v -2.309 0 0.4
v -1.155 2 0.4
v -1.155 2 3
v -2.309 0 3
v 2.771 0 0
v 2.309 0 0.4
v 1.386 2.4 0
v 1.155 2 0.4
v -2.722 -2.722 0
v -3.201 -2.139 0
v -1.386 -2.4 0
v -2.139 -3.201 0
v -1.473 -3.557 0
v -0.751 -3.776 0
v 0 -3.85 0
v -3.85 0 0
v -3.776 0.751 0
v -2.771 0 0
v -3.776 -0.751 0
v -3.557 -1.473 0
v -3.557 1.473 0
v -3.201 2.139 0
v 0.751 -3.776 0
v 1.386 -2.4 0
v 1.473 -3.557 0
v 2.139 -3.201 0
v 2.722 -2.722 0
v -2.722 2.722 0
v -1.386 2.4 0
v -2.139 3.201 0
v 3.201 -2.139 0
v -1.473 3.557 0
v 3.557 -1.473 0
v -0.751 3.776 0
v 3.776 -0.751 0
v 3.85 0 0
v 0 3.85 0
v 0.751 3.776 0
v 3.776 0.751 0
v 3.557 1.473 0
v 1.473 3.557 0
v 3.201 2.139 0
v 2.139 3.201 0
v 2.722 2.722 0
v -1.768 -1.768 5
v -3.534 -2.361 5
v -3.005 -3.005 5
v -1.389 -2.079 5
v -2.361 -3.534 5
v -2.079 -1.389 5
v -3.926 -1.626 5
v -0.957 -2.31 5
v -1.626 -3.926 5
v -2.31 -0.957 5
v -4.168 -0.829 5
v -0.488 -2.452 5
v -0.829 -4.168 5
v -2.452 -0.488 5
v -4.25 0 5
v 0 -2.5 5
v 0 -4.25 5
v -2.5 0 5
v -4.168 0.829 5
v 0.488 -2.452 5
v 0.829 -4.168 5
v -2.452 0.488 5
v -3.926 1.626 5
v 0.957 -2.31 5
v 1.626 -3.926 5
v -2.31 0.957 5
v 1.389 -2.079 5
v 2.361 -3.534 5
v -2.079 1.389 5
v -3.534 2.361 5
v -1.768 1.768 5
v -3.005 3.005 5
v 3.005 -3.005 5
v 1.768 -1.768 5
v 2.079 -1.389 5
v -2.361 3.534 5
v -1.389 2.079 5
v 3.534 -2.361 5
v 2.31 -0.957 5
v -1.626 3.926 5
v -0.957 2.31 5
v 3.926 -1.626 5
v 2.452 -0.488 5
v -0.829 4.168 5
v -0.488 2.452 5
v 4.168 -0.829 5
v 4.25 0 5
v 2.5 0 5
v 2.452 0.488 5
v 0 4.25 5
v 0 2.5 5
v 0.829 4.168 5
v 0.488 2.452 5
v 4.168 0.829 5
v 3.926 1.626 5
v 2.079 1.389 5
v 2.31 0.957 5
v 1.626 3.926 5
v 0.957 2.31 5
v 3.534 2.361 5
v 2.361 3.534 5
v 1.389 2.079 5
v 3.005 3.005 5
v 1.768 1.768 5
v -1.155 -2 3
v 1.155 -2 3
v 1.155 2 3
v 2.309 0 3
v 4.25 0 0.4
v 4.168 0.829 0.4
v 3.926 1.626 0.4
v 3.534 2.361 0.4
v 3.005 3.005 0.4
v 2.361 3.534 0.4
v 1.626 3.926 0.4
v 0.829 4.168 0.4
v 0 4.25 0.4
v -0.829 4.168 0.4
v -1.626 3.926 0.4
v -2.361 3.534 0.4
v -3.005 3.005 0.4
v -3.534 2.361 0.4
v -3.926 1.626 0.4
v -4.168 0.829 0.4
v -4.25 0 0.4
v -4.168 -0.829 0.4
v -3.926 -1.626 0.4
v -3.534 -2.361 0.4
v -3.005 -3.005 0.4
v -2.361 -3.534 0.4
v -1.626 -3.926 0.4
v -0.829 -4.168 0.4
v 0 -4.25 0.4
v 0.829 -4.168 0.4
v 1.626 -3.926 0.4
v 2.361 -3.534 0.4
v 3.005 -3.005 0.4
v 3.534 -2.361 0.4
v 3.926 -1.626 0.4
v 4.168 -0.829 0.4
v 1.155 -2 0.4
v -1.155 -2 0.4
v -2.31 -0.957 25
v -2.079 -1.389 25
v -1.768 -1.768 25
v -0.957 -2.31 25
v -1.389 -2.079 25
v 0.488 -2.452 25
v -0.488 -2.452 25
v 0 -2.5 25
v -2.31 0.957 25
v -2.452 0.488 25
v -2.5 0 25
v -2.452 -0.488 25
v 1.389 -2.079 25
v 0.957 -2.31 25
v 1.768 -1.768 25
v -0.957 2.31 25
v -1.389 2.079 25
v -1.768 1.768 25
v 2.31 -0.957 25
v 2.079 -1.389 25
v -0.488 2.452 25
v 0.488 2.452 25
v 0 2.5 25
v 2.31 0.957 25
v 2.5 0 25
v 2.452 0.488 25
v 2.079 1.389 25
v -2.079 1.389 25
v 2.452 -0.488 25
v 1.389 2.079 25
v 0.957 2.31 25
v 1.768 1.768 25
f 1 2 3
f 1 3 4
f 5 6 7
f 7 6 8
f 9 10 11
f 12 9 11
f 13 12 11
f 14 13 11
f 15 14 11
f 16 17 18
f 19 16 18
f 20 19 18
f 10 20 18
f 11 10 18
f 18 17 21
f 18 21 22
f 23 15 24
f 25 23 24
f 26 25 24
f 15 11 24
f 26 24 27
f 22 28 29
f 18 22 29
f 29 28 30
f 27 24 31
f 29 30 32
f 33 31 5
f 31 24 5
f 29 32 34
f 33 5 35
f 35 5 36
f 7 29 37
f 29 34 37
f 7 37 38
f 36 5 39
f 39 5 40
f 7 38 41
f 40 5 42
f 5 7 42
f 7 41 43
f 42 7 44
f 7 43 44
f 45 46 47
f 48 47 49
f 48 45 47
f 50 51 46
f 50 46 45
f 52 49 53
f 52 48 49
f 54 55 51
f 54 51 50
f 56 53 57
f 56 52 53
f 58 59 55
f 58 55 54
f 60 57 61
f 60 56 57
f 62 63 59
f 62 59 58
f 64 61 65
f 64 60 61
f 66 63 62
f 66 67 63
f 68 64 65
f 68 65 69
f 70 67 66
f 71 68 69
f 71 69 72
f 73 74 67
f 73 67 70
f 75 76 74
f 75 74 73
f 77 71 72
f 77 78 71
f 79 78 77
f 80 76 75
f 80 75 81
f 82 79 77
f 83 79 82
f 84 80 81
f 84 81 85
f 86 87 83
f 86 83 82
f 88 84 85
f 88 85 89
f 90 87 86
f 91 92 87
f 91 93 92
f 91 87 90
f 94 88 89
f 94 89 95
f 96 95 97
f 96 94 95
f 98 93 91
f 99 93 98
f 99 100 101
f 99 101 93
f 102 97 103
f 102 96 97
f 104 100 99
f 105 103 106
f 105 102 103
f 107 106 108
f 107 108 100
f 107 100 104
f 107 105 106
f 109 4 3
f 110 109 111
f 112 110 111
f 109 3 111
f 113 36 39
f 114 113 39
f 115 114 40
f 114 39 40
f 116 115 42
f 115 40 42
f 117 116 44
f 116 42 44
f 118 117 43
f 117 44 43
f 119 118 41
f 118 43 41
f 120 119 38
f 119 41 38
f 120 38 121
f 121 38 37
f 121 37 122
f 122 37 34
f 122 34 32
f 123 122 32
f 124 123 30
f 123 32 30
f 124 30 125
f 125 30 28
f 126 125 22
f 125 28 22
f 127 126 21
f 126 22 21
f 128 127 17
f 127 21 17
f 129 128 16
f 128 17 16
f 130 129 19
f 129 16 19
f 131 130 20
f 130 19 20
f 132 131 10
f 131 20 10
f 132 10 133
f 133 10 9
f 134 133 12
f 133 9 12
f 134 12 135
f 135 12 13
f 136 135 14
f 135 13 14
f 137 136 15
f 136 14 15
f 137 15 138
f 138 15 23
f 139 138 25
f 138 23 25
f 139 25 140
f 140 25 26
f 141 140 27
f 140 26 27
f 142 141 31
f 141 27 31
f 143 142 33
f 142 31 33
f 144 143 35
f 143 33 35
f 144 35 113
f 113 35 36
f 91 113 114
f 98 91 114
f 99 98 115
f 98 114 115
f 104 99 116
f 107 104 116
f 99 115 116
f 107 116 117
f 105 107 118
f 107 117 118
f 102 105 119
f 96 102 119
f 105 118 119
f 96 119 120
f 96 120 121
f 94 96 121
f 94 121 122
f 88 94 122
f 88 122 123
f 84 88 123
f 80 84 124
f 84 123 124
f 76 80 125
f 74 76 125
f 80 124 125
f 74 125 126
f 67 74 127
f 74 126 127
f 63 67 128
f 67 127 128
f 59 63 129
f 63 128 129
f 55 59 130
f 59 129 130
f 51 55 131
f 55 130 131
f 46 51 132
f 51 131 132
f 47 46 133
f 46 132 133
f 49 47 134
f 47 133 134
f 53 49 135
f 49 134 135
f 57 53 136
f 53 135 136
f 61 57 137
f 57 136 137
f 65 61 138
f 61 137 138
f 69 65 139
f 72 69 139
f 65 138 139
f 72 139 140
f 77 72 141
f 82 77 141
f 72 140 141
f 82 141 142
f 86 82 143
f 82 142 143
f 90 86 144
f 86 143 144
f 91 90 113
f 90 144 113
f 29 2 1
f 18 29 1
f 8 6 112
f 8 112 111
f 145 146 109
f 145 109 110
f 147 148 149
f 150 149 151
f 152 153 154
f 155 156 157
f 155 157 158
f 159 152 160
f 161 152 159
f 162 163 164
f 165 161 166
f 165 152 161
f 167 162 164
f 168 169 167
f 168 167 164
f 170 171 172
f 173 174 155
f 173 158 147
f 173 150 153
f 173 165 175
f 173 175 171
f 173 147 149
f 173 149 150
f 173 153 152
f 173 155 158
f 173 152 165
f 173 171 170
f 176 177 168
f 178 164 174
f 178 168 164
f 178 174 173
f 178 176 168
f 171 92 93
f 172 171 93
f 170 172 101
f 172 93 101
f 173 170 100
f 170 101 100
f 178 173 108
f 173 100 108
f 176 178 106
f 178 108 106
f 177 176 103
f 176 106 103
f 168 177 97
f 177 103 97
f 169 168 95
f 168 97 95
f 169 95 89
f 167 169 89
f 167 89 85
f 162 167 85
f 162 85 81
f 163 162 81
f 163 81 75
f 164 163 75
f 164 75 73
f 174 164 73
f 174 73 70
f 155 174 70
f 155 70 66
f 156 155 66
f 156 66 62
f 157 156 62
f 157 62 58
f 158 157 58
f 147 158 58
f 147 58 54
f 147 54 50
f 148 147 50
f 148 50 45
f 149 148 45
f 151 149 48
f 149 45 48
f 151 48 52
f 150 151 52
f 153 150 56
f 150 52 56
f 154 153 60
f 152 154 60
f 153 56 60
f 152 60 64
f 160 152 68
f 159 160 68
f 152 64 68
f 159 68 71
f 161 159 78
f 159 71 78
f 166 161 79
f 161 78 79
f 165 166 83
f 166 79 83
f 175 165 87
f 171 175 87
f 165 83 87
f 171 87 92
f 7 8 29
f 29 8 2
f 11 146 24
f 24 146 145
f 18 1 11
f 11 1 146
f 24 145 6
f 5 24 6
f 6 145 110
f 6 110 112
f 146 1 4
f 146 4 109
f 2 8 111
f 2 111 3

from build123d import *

# Parameters (mm, degrees)
SK_SHANK_R        = 2.5
EXT_SHANK_DEPTH   = 25
SK_HEAD_R         = 4.25
EXT_HEAD_DEPTH    = 5
CUT_HEX_DEPTH     = 3
CHAMFER_HEAD_SIZE = 0.4


with BuildPart() as part:
    # Sk_shank → Ext_shank (new body)
    with BuildSketch(Plane.XY):
        Circle(SK_SHANK_R)
    extrude(amount=EXT_SHANK_DEPTH)

    # Sk_head → Ext_head (add)
    with BuildSketch(Plane.XY):
        Circle(SK_HEAD_R)
    extrude(amount=EXT_HEAD_DEPTH)

    # Sk_hex → Cut_hex (cut)
    with BuildSketch(Plane.XY):
        Polygon((2.309401077, 0), (1.154700538, 2), (-1.154700538, 2), (-2.309401077, 0), (-1.154700538, -2), (1.154700538, -2), align=None)
    extrude(amount=CUT_HEX_DEPTH, mode=Mode.SUBTRACT)

    # Chamfer_head
    chamfer_head_edges = [part.edges().sort_by_distance(p)[0] for p in [
        (1.732050808, -1, 0),
        (1.732050808, 1, 0),
        (0, 2, 0),
        (-1.732050808, 1, 0),
        (-1.732050808, -1, 0),
        (0, -2, 0),
        (-4.25, 0, 0),
    ]]
    chamfer(chamfer_head_edges, length=CHAMFER_HEAD_SIZE)


solid = part.part
